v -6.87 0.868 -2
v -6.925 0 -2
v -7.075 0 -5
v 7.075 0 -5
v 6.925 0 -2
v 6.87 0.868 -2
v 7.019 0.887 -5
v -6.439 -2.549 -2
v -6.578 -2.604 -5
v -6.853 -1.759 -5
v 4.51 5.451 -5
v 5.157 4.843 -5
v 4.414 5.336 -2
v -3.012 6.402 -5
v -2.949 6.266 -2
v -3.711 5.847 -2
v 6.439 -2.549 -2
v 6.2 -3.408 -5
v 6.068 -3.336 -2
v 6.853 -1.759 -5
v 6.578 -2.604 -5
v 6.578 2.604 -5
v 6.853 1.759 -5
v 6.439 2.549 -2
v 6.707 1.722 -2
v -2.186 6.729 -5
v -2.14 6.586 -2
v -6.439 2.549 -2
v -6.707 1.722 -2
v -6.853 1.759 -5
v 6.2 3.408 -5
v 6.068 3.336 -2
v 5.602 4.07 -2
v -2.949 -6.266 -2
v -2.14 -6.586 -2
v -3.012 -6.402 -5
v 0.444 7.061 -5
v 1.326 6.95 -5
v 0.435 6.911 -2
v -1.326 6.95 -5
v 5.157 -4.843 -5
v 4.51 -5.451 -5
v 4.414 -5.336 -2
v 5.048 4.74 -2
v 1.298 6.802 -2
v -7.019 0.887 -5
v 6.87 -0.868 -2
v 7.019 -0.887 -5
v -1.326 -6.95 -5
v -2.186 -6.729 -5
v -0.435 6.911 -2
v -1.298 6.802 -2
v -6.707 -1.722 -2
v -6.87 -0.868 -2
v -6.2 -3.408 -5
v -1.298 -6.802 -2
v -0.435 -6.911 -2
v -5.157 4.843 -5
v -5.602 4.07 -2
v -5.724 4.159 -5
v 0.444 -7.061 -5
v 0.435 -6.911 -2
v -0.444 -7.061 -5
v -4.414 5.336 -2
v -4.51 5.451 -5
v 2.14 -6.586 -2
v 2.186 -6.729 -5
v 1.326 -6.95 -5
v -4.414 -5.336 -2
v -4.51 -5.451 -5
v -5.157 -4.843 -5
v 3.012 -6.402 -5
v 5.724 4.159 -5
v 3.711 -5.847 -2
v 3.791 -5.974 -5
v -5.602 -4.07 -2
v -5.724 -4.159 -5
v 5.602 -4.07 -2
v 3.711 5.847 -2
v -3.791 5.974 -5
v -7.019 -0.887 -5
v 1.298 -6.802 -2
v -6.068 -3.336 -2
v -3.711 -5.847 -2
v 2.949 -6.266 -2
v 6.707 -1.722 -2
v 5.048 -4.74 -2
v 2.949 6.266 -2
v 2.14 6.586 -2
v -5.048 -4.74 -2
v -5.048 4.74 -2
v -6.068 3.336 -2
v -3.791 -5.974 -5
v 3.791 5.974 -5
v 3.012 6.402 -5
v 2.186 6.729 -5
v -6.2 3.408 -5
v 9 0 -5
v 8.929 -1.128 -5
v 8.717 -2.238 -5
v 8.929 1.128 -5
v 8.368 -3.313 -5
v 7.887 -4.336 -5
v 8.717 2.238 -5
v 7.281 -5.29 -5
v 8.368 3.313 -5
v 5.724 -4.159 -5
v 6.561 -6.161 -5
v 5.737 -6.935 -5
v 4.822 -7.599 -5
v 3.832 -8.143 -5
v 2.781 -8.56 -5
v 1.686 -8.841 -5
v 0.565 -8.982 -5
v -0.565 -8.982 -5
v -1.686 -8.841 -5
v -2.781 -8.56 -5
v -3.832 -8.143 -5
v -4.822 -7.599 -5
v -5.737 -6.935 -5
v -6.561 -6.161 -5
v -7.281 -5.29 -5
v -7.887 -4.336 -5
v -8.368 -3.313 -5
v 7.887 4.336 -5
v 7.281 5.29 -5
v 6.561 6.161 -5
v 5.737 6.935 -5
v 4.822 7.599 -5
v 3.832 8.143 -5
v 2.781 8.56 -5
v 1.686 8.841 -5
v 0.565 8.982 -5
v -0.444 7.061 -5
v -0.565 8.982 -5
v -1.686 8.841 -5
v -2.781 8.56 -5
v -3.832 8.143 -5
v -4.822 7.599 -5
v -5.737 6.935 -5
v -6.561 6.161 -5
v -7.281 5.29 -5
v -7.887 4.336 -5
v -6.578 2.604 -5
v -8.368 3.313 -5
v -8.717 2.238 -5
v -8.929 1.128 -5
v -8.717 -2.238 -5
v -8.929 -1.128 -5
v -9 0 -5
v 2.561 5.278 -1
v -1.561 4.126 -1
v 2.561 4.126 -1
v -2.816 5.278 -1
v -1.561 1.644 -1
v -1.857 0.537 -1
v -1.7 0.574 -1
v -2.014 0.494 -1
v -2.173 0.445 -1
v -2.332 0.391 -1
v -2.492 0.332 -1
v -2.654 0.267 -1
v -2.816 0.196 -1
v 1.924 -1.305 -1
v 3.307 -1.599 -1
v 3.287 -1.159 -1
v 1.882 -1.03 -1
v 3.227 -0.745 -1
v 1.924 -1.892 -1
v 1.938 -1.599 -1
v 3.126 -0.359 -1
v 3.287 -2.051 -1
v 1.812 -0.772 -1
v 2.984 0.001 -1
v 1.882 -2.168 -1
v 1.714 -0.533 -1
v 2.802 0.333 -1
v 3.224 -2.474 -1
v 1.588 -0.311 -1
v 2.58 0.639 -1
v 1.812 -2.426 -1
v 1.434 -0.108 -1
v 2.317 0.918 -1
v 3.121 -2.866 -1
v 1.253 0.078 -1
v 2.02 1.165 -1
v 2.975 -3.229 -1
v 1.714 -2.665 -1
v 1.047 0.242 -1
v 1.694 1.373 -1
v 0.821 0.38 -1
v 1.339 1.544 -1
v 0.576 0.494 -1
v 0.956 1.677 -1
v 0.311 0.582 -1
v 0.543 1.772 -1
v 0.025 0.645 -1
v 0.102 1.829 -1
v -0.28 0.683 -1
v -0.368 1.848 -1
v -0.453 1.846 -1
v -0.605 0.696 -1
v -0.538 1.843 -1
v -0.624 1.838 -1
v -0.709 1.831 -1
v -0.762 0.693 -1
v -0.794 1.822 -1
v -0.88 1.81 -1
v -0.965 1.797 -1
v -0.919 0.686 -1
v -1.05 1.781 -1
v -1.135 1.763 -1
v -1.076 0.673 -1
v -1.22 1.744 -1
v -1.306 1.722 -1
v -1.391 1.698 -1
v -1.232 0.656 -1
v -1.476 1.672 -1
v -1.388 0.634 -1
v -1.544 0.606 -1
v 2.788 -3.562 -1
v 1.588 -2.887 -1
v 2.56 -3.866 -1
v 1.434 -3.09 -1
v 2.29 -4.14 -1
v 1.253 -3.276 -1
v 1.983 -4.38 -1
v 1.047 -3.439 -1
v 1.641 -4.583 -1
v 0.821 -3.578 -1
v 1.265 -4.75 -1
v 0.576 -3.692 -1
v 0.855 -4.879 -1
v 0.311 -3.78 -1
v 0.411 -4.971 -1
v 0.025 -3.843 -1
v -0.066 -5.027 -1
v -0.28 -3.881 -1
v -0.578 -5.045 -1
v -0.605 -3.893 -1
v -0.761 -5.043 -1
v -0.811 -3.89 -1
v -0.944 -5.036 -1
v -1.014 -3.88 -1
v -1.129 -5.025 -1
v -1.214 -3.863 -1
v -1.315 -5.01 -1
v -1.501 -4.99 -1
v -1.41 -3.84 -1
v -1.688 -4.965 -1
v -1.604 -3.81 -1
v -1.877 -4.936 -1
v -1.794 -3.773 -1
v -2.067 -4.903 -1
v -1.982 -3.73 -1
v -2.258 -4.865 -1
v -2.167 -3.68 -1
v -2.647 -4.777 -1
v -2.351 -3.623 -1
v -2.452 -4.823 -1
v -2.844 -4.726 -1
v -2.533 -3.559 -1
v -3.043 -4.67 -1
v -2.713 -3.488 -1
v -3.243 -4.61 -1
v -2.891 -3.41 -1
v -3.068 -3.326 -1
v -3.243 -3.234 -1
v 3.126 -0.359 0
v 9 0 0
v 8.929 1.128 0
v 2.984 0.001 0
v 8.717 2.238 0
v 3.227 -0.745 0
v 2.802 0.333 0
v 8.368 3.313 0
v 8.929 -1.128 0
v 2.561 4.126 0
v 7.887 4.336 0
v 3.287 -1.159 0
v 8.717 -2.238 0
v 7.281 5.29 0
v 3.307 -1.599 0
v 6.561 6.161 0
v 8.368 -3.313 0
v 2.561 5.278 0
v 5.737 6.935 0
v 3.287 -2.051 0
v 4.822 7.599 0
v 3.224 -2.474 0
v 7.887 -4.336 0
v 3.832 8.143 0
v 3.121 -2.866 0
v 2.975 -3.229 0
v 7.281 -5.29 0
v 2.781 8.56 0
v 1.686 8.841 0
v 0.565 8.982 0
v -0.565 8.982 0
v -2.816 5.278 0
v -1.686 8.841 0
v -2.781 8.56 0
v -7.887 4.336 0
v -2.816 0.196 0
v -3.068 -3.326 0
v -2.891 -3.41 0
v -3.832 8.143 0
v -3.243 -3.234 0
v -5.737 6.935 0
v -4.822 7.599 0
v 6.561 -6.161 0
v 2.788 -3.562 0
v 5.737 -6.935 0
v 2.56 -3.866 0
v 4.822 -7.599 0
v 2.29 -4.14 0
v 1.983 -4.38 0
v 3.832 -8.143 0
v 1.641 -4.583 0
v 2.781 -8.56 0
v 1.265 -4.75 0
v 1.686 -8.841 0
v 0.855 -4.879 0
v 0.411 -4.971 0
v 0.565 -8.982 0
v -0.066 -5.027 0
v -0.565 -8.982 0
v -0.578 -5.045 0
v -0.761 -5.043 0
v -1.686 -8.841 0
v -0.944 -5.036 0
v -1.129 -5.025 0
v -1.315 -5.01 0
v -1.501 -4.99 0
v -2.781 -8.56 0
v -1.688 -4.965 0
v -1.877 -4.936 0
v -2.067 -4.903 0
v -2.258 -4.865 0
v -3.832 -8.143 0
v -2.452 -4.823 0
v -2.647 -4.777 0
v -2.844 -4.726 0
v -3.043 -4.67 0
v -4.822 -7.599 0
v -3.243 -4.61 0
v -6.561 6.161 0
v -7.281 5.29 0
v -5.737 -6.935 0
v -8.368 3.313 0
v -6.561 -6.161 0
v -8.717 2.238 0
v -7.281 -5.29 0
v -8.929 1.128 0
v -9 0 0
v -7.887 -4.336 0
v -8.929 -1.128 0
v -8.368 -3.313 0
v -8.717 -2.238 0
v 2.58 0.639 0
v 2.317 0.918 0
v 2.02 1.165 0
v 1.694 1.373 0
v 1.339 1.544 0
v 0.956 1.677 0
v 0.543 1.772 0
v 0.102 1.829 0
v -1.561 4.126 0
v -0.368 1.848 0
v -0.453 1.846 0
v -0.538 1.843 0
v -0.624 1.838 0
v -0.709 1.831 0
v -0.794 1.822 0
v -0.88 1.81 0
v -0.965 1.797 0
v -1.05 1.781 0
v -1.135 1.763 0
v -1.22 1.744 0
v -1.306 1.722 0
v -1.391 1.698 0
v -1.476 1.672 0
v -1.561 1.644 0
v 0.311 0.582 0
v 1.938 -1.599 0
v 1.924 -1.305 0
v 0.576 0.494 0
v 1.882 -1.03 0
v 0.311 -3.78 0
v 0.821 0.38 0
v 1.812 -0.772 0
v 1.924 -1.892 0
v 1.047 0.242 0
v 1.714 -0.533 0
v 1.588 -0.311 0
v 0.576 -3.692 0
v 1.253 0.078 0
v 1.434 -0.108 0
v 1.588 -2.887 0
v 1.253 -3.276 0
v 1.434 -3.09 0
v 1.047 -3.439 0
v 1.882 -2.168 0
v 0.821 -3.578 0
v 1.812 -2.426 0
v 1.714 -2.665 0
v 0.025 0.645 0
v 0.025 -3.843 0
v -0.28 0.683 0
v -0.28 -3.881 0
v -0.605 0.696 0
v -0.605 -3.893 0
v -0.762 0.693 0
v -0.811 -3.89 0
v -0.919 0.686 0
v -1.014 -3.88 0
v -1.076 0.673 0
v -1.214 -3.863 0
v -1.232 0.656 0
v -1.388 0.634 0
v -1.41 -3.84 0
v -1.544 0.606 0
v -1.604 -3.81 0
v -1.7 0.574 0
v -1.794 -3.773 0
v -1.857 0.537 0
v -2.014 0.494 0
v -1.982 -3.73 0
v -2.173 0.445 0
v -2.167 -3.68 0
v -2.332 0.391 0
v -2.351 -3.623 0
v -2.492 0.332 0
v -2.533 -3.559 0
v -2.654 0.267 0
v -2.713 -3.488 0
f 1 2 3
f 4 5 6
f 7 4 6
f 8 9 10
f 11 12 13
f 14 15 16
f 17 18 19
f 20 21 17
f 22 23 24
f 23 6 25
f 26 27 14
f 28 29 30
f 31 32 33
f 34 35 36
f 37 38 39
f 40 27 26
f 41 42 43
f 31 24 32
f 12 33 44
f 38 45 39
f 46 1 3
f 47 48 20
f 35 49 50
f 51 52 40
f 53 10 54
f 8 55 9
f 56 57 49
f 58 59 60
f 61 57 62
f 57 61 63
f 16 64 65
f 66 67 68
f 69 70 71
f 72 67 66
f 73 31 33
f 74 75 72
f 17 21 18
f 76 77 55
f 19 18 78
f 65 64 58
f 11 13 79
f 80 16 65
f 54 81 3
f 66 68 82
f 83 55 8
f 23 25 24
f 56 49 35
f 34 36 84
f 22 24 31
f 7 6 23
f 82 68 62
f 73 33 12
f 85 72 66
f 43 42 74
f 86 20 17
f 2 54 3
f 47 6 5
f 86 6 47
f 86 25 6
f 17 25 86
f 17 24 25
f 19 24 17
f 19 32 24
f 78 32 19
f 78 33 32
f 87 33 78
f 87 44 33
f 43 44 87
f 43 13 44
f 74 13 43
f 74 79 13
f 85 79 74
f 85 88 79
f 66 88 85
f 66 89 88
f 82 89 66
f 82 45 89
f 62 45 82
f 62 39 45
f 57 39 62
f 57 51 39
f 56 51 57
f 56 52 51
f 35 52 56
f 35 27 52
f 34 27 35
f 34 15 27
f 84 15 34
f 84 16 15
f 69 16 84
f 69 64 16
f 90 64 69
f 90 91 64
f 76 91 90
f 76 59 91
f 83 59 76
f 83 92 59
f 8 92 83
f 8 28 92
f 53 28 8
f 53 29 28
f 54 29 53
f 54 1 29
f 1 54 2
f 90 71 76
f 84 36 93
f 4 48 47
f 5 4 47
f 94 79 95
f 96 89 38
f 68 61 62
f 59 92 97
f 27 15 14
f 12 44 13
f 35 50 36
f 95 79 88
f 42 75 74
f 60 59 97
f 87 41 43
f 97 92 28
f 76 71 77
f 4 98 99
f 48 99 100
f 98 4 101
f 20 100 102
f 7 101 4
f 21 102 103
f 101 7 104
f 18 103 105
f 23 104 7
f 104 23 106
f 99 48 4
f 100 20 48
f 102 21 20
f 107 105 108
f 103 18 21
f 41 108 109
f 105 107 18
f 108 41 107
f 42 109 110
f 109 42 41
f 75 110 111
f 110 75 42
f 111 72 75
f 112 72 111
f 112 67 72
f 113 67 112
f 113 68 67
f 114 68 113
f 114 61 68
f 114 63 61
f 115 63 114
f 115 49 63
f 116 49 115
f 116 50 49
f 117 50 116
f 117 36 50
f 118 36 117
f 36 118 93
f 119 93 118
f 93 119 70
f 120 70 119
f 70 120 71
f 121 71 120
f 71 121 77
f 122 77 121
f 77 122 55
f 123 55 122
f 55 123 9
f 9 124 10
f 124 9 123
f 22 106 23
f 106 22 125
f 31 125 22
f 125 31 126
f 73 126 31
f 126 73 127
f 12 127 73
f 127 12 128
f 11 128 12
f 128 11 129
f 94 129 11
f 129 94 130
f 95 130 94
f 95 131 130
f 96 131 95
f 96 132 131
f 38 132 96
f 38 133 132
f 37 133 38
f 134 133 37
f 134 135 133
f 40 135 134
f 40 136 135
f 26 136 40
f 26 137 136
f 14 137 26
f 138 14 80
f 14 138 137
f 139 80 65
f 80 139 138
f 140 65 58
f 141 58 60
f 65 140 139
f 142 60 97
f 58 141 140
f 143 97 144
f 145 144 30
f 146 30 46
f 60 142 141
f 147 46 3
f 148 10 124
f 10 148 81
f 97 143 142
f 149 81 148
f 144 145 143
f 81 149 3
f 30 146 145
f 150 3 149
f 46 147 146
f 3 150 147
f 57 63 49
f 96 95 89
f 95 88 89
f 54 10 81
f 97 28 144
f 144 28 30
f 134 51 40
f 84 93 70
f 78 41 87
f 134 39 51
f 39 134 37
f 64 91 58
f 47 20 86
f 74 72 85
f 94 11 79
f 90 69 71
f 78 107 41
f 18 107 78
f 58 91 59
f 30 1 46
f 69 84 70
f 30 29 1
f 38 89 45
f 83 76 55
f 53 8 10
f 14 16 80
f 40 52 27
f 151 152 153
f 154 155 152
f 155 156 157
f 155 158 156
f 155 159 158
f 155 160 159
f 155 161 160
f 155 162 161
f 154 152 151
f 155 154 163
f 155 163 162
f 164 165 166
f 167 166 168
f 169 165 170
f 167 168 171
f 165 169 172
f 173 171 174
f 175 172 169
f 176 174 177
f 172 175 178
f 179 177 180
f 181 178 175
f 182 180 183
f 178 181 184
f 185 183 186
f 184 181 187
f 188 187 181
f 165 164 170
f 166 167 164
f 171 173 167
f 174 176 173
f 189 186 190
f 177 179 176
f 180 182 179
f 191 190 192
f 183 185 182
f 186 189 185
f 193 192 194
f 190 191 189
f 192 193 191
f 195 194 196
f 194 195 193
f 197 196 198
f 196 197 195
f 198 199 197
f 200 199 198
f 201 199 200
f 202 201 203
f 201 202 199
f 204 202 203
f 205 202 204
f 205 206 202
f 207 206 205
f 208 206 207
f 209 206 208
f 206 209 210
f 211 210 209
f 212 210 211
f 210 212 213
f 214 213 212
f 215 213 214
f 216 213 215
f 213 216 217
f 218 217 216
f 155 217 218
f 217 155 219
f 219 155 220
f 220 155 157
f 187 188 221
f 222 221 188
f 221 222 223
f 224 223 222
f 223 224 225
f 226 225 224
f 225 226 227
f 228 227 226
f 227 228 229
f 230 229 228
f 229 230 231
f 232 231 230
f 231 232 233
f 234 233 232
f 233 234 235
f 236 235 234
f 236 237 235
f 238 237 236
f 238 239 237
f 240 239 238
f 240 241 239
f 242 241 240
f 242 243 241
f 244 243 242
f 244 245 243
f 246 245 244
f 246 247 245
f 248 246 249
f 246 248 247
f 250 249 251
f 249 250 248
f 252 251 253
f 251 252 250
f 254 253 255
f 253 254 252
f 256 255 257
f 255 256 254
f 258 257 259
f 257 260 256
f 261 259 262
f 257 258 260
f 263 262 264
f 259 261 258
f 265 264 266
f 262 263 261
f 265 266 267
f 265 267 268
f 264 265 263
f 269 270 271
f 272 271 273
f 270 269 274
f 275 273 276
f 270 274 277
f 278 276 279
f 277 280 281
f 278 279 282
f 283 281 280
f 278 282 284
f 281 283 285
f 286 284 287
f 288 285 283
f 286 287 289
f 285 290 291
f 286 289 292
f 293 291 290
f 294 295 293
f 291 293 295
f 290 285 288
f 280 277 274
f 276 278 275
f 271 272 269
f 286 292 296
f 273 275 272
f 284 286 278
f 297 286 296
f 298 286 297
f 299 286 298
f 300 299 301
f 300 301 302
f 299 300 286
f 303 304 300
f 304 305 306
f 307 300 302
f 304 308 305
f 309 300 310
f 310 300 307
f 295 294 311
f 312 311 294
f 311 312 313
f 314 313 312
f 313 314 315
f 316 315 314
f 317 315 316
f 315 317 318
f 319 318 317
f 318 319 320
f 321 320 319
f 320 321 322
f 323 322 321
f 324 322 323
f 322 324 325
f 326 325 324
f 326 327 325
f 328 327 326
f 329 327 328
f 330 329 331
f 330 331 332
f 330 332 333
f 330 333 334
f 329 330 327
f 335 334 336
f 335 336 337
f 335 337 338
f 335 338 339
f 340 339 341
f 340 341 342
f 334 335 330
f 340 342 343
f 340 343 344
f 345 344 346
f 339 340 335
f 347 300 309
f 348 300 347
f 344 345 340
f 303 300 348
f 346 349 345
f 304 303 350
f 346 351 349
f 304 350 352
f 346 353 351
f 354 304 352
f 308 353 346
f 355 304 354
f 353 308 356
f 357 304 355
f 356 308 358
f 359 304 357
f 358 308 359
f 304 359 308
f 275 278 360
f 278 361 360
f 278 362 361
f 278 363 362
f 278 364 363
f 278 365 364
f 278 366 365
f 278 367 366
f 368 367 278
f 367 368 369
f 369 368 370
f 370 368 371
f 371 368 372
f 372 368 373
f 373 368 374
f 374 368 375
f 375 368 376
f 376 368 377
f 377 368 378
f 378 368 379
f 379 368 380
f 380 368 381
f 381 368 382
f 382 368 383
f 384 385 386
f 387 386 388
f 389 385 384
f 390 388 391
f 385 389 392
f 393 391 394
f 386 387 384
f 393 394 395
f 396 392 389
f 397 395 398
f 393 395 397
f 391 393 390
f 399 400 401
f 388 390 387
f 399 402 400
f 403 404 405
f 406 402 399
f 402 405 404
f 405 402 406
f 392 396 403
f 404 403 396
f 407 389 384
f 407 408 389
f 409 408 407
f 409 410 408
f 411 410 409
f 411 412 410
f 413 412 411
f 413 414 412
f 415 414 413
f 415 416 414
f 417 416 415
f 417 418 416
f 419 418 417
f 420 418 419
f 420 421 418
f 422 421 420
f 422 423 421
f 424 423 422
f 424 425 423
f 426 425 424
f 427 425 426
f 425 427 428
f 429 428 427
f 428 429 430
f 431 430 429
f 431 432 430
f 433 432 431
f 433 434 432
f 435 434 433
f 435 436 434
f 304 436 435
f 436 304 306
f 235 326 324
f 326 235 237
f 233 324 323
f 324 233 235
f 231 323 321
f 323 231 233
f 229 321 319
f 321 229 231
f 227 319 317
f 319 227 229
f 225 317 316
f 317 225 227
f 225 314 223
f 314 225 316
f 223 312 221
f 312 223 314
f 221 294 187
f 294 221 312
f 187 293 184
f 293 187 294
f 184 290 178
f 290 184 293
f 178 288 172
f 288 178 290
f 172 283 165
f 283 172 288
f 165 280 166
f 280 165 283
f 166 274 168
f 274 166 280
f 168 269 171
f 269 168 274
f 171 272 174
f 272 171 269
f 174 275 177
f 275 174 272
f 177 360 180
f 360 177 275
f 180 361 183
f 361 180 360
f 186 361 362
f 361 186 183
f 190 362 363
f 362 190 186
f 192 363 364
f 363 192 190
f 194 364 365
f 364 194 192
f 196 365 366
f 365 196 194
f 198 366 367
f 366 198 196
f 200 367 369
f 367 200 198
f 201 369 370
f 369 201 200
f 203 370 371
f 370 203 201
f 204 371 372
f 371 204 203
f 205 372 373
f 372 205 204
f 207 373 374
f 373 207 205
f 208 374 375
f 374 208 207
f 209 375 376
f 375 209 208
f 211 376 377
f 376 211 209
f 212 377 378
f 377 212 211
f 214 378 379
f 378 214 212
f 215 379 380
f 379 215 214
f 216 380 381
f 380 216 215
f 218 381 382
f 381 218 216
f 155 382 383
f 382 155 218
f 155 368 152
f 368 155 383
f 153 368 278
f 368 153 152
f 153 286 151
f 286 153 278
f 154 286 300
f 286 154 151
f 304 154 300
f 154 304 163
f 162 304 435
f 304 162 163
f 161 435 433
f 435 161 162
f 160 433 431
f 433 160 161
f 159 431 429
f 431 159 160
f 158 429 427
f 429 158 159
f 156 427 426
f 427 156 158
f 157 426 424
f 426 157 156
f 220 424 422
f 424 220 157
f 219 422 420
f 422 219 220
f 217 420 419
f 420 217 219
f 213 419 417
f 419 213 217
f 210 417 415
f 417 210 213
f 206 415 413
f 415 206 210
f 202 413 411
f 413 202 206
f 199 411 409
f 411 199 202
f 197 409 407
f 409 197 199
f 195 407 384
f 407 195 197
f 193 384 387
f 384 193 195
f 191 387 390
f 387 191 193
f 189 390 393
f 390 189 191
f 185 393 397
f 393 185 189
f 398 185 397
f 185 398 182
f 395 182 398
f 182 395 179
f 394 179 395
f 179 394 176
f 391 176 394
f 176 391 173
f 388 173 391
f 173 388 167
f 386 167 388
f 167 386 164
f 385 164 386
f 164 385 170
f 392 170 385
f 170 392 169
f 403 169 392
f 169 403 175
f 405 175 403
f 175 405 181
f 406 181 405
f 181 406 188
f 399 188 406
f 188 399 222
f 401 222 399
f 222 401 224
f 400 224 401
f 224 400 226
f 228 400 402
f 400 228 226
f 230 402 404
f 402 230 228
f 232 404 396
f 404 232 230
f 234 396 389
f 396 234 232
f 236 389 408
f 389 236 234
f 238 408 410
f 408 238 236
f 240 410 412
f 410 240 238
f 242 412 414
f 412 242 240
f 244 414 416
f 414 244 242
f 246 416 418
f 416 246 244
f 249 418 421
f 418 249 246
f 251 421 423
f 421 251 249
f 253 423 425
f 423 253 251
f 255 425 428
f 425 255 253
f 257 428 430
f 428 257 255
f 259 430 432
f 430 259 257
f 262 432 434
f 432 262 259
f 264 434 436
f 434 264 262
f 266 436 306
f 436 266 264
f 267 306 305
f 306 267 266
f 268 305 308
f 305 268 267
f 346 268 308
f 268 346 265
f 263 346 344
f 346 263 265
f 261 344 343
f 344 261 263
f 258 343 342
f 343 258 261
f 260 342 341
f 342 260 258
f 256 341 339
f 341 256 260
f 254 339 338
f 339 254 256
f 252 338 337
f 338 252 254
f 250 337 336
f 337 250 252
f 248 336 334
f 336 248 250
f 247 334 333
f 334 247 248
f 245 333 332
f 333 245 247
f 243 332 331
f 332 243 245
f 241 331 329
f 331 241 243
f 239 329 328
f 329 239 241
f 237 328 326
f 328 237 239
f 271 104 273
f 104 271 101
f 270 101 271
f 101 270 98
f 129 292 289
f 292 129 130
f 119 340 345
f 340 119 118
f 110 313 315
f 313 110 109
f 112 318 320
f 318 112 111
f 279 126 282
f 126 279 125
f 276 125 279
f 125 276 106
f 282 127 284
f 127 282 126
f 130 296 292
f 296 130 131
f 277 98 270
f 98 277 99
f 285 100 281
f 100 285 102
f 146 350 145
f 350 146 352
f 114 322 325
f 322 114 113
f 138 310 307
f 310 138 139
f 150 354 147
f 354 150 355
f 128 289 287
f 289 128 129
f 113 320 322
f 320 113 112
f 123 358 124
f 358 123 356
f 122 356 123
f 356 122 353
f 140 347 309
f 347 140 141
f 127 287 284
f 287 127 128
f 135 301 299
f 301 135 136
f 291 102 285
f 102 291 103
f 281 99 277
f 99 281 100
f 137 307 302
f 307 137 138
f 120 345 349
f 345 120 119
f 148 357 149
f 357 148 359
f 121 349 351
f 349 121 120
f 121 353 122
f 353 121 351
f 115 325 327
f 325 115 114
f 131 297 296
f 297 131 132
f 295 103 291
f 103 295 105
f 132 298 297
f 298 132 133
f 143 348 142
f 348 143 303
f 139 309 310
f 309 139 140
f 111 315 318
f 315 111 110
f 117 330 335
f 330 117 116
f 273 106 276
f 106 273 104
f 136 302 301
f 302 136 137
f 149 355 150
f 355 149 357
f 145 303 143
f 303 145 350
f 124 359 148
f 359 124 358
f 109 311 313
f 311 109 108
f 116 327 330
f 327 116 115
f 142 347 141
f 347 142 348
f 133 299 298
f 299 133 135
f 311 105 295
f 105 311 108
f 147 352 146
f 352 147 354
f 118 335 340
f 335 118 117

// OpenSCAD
$fn = 50;

difference() {
	union() {
		translate(v = [0, 0, -5.0]) {
			cylinder(h = 5, r = 9.0);
		}
	}
	union() {
		#translate(v = [0, 0, -5.0]) {
			cylinder(h = 3, r1 = 7.075, r2 = 6.925);
		}
		translate(v = [0, 0, -1]) {
			linear_extrude(height = 1) {
				text(font = "Impact", halign = "center", size = 10, text = "5", valign = "center");
			}
		}
	}
}
